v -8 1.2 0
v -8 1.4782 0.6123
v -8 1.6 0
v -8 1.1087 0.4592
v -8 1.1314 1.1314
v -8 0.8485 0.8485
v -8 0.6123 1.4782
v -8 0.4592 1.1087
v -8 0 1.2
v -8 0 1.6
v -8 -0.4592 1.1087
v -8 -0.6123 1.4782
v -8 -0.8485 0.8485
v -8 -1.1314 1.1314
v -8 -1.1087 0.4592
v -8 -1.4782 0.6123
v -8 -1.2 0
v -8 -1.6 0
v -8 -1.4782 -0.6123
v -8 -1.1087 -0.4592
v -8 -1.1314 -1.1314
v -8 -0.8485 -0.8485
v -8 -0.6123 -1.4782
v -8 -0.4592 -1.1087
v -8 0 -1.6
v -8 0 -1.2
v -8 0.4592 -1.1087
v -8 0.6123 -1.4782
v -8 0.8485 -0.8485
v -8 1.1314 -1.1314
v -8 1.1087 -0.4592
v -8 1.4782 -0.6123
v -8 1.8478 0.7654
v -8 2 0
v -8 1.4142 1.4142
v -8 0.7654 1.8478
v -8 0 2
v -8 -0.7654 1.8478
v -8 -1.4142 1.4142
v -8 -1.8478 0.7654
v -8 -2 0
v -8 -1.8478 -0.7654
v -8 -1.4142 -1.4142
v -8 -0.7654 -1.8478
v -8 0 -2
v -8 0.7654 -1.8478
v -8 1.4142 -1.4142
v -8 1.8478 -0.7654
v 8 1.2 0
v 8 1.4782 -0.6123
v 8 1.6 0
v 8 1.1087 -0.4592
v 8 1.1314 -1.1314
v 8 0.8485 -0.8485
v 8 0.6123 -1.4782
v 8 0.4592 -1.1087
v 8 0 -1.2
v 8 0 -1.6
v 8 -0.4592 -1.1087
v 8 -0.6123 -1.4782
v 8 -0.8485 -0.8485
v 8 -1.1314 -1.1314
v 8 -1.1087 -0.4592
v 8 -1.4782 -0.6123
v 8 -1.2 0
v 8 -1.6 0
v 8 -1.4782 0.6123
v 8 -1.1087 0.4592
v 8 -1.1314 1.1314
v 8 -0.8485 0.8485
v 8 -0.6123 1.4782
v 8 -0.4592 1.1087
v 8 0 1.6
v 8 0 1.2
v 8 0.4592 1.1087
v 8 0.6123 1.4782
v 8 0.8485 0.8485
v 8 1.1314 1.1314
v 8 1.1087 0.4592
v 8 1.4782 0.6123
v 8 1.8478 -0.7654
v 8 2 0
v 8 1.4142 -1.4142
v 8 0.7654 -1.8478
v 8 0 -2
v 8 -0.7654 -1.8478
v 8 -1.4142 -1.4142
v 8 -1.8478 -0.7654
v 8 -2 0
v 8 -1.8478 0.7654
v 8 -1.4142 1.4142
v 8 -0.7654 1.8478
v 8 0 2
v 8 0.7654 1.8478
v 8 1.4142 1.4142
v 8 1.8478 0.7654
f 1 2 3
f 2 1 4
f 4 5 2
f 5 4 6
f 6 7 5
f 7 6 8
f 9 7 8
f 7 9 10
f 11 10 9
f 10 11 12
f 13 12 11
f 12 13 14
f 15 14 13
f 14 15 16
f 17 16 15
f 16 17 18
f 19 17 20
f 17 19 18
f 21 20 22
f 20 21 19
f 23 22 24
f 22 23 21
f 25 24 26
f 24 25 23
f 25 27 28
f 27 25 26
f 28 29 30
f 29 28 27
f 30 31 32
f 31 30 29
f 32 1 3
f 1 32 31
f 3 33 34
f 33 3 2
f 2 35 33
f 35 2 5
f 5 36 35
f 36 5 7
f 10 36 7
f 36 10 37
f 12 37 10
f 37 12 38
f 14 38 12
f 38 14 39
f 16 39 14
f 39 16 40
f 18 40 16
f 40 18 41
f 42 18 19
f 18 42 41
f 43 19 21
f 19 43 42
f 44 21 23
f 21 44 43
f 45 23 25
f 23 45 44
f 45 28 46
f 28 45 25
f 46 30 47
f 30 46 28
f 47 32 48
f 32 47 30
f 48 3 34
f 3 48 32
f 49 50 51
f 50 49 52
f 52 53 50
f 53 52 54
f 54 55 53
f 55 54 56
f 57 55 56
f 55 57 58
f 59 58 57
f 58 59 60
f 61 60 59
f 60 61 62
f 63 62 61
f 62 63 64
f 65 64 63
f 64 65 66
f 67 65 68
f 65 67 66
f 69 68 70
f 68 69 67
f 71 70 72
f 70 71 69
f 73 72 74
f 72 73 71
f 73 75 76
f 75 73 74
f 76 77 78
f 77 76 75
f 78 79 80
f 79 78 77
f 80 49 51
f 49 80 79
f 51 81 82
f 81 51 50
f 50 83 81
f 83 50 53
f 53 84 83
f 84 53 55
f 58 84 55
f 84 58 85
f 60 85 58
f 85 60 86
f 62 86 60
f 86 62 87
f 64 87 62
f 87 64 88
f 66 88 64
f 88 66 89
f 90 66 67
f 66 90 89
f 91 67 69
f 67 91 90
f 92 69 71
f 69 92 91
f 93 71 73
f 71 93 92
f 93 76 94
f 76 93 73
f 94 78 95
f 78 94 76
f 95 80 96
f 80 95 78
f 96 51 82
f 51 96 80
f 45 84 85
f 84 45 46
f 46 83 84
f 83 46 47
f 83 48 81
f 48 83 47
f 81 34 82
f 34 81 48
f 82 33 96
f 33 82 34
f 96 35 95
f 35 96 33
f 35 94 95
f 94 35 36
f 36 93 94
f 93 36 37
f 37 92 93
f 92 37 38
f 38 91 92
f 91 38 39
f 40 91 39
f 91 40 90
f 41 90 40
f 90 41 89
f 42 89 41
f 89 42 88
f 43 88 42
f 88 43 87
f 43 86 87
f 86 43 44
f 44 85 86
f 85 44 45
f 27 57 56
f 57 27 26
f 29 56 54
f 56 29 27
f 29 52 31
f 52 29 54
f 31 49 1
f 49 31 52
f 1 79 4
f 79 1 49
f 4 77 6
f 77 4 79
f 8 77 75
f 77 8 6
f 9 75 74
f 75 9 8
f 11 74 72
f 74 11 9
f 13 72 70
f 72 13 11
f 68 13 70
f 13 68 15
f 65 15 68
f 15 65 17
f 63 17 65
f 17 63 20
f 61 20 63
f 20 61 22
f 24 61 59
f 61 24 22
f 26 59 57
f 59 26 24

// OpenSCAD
// file: ../p/4-4cyli.scad
use <../lib.scad>
function ldraw_lib__4_4cyli() = [
// 0 Cylinder 1.0
// 0 Name: 4-4cyli.dat
// 0 Author: James Jessiman
// 0 !LDRAW_ORG Primitive UPDATE 2005-01
// 0 !LICENSE Licensed under CC BY 4.0 : see CAreadme.txt
// 
// 0 BFC CERTIFY CCW
  [0,"BFC","CERTIFY"],
  [0,"BFC","CCW"],
// 
// 0 !HISTORY 1998-12-15 [PTadmin] Official Update 1998-10
// 0 !HISTORY 2002-03-23 [sbliss] Added BFC statement; merged headers from files in distributions LDraw 0.27 and Complete.
// 0 !HISTORY 2002-04-25 [PTadmin] Official Update 2002-02
// 0 !HISTORY 2004-12-14 [guyvivan] BFC CCW
// 0 !HISTORY 2005-12-28 [PTadmin] Official Update 2005-01
// 0 !HISTORY 2007-06-24 [PTadmin] Header formatted for Contributor Agreement
// 0 !HISTORY 2008-07-01 [PTadmin] Official Update 2008-01
// 
// 
// 4 16 1 1 0 0.9239 1 0.3827 0.9239 0 0.3827 1 0 0
  [4,16,1,1,0,0.9239,1,0.3827,0.9239,0,0.3827,1,0,0],
// 5 24 1 0 0 1 1 0 0.9239 0 0.3827 0.9239 0 -0.3827
  [5,24,1,0,0,1,1,0,0.9239,0,0.3827,0.9239,0,-0.3827],
// 4 16 0.9239 1 0.3827 0.7071 1 0.7071 0.7071 0 0.7071 0.9239 0 0.3827
  [4,16,0.9239,1,0.3827,0.7071,1,0.7071,0.7071,0,0.7071,0.9239,0,0.3827],
// 5 24 0.9239 0 0.3827 0.9239 1 0.3827 0.7071 0 0.7071 1 0 0
  [5,24,0.9239,0,0.3827,0.9239,1,0.3827,0.7071,0,0.7071,1,0,0],
// 4 16 0.7071 1 0.7071 0.3827 1 0.9239 0.3827 0 0.9239 0.7071 0 0.7071
  [4,16,0.7071,1,0.7071,0.3827,1,0.9239,0.3827,0,0.9239,0.7071,0,0.7071],
// 5 24 0.7071 0 0.7071 0.7071 1 0.7071 0.3827 0 0.9239 0.9239 0 0.3827
  [5,24,0.7071,0,0.7071,0.7071,1,0.7071,0.3827,0,0.9239,0.9239,0,0.3827],
// 4 16 0.3827 1 0.9239 0 1 1 0 0 1 0.3827 0 0.9239
  [4,16,0.3827,1,0.9239,0,1,1,0,0,1,0.3827,0,0.9239],
// 5 24 0.3827 0 0.9239 0.3827 1 0.9239 0 0 1 0.7071 0 0.7071
  [5,24,0.3827,0,0.9239,0.3827,1,0.9239,0,0,1,0.7071,0,0.7071],
// 4 16 0 1 1 -0.3827 1 0.9239 -0.3827 0 0.9239 0 0 1
  [4,16,0,1,1,-0.3827,1,0.9239,-0.3827,0,0.9239,0,0,1],
// 5 24 0 0 1 0 1 1 -0.3827 0 0.9239 0.3827 0 0.9239
  [5,24,0,0,1,0,1,1,-0.3827,0,0.9239,0.3827,0,0.9239],
// 4 16 -0.3827 1 0.9239 -0.7071 1 0.7071 -0.7071 0 0.7071 -0.3827 0 0.9239
  [4,16,-0.3827,1,0.9239,-0.7071,1,0.7071,-0.7071,0,0.7071,-0.3827,0,0.9239],
// 5 24 -0.3827 0 0.9239 -0.3827 1 0.9239 -0.7071 0 0.7071 0 0 1
  [5,24,-0.3827,0,0.9239,-0.3827,1,0.9239,-0.7071,0,0.7071,0,0,1],
// 4 16 -0.7071 1 0.7071 -0.9239 1 0.3827 -0.9239 0 0.3827 -0.7071 0 0.7071
  [4,16,-0.7071,1,0.7071,-0.9239,1,0.3827,-0.9239,0,0.3827,-0.7071,0,0.7071],
// 5 24 -0.7071 0 0.7071 -0.7071 1 0.7071 -0.9239 0 0.3827 -0.3827 0 0.9239
  [5,24,-0.7071,0,0.7071,-0.7071,1,0.7071,-0.9239,0,0.3827,-0.3827,0,0.9239],
// 4 16 -0.9239 1 0.3827 -1 1 0 -1 0 0 -0.9239 0 0.3827
  [4,16,-0.9239,1,0.3827,-1,1,0,-1,0,0,-0.9239,0,0.3827],
// 5 24 -0.9239 0 0.3827 -0.9239 1 0.3827 -1 0 0 -0.7071 0 0.7071
  [5,24,-0.9239,0,0.3827,-0.9239,1,0.3827,-1,0,0,-0.7071,0,0.7071],
// 4 16 -1 1 0 -0.9239 1 -0.3827 -0.9239 0 -0.3827 -1 0 0
  [4,16,-1,1,0,-0.9239,1,-0.3827,-0.9239,0,-0.3827,-1,0,0],
// 5 24 -1 0 0 -1 1 0 -0.9239 0 -0.3827 -0.9239 0 0.3827
  [5,24,-1,0,0,-1,1,0,-0.9239,0,-0.3827,-0.9239,0,0.3827],
// 4 16 -0.9239 1 -0.3827 -0.7071 1 -0.7071 -0.7071 0 -0.7071 -0.9239 0 -0.3827
  [4,16,-0.9239,1,-0.3827,-0.7071,1,-0.7071,-0.7071,0,-0.7071,-0.9239,0,-0.3827],
// 5 24 -0.9239 0 -0.3827 -0.9239 1 -0.3827 -0.7071 0 -0.7071 -1 0 0
  [5,24,-0.9239,0,-0.3827,-0.9239,1,-0.3827,-0.7071,0,-0.7071,-1,0,0],
// 4 16 -0.7071 1 -0.7071 -0.3827 1 -0.9239 -0.3827 0 -0.9239 -0.7071 0 -0.7071
  [4,16,-0.7071,1,-0.7071,-0.3827,1,-0.9239,-0.3827,0,-0.9239,-0.7071,0,-0.7071],
// 5 24 -0.7071 0 -0.7071 -0.7071 1 -0.7071 -0.3827 0 -0.9239 -0.9239 0 -0.3827
  [5,24,-0.7071,0,-0.7071,-0.7071,1,-0.7071,-0.3827,0,-0.9239,-0.9239,0,-0.3827],
// 4 16 -0.3827 1 -0.9239 0 1 -1 0 0 -1 -0.3827 0 -0.9239
  [4,16,-0.3827,1,-0.9239,0,1,-1,0,0,-1,-0.3827,0,-0.9239],
// 5 24 -0.3827 0 -0.9239 -0.3827 1 -0.9239 0 0 -1 -0.7071 0 -0.7071
  [5,24,-0.3827,0,-0.9239,-0.3827,1,-0.9239,0,0,-1,-0.7071,0,-0.7071],
// 4 16 0 1 -1 0.3827 1 -0.9239 0.3827 0 -0.9239 0 0 -1
  [4,16,0,1,-1,0.3827,1,-0.9239,0.3827,0,-0.9239,0,0,-1],
// 5 24 0 0 -1 0 1 -1 0.3827 0 -0.9239 -0.3827 0 -0.9239
  [5,24,0,0,-1,0,1,-1,0.3827,0,-0.9239,-0.3827,0,-0.9239],
// 4 16 0.3827 1 -0.9239 0.7071 1 -0.7071 0.7071 0 -0.7071 0.3827 0 -0.9239
  [4,16,0.3827,1,-0.9239,0.7071,1,-0.7071,0.7071,0,-0.7071,0.3827,0,-0.9239],
// 5 24 0.3827 0 -0.9239 0.3827 1 -0.9239 0.7071 0 -0.7071 0 0 -1
  [5,24,0.3827,0,-0.9239,0.3827,1,-0.9239,0.7071,0,-0.7071,0,0,-1],
// 4 16 0.7071 1 -0.7071 0.9239 1 -0.3827 0.9239 0 -0.3827 0.7071 0 -0.7071
  [4,16,0.7071,1,-0.7071,0.9239,1,-0.3827,0.9239,0,-0.3827,0.7071,0,-0.7071],
// 5 24 0.7071 0 -0.7071 0.7071 1 -0.7071 0.9239 0 -0.3827 0.3827 0 -0.9239
  [5,24,0.7071,0,-0.7071,0.7071,1,-0.7071,0.9239,0,-0.3827,0.3827,0,-0.9239],
// 4 16 0.9239 1 -0.3827 1 1 0 1 0 0 0.9239 0 -0.3827
  [4,16,0.9239,1,-0.3827,1,1,0,1,0,0,0.9239,0,-0.3827],
// 5 24 0.9239 0 -0.3827 0.9239 1 -0.3827 1 0 0 0.7071 0 -0.7071
  [5,24,0.9239,0,-0.3827,0.9239,1,-0.3827,1,0,0,0.7071,0,-0.7071],
// 0
];
module ldraw_lib__4_4cyli(step=0, col=false, unit=2/5, alt=false, line=0.2, solid=!$preview)
    makepoly(ldraw_lib__4_4cyli(), step=step, col=col, unit=unit, alt=alt, line=line, solid=solid);
ldraw_lib__4_4cyli(line=0.2);
// file: ../p/4-4ring4.scad
use <../lib.scad>
function ldraw_lib__4_4ring4() = [
// 0 Ring  4 x 1.0
// 0 Name: 4-4ring4.dat
// 0 Author: James Jessiman
// 0 !LDRAW_ORG Primitive UPDATE 2009-01
// 0 !LICENSE Licensed under CC BY 4.0 : see CAreadme.txt
// 
// 0 BFC CERTIFY CCW
  [0,"BFC","CERTIFY"],
  [0,"BFC","CCW"],
// 
// 0 !HISTORY 1998-12-15 [PTadmin] Official Update 1998-10
// 0 !HISTORY 2002-04-08 [BrickCaster] Modified for BFC compliance
// 0 !HISTORY 2002-04-25 [PTadmin] Official Update 2002-02
// 0 !HISTORY 2007-06-24 [PTadmin] Header formatted for Contributor Agreement
// 0 !HISTORY 2008-07-01 [PTadmin] Official Update 2008-01
// 0 !HISTORY 2008-08-26 [cwdee] Switch polygon winding and rename
// 0 !HISTORY 2009-05-02 [PTadmin] Official Update 2009-01
// 
// 
// 4 16 -1.9135 0 4.6195 -1.5308 0 3.6956 0 0 4 0 0 5
  [4,16,-1.9135,0,4.6195,-1.5308,0,3.6956,0,0,4,0,0,5],
// 4 16 -3.5355 0 3.5355 -2.8284 0 2.8284 -1.5308 0 3.6956 -1.9135 0 4.6195
  [4,16,-3.5355,0,3.5355,-2.8284,0,2.8284,-1.5308,0,3.6956,-1.9135,0,4.6195],
// 4 16 -4.6195 0 1.9135 -3.6956 0 1.5308 -2.8284 0 2.8284 -3.5355 0 3.5355
  [4,16,-4.6195,0,1.9135,-3.6956,0,1.5308,-2.8284,0,2.8284,-3.5355,0,3.5355],
// 4 16 -5 0 0 -4 0 0 -3.6956 0 1.5308 -4.6195 0 1.9135
  [4,16,-5,0,0,-4,0,0,-3.6956,0,1.5308,-4.6195,0,1.9135],
// 4 16 -4.6195 0 -1.9135 -3.6956 0 -1.5308 -4 0 0 -5 0 0
  [4,16,-4.6195,0,-1.9135,-3.6956,0,-1.5308,-4,0,0,-5,0,0],
// 4 16 -3.5355 0 -3.5355 -2.8284 0 -2.8284 -3.6956 0 -1.5308 -4.6195 0 -1.9135
  [4,16,-3.5355,0,-3.5355,-2.8284,0,-2.8284,-3.6956,0,-1.5308,-4.6195,0,-1.9135],
// 4 16 -1.9135 0 -4.6195 -1.5308 0 -3.6956 -2.8284 0 -2.8284 -3.5355 0 -3.5355
  [4,16,-1.9135,0,-4.6195,-1.5308,0,-3.6956,-2.8284,0,-2.8284,-3.5355,0,-3.5355],
// 4 16 0 0 -5 0 0 -4 -1.5308 0 -3.6956 -1.9135 0 -4.6195
  [4,16,0,0,-5,0,0,-4,-1.5308,0,-3.6956,-1.9135,0,-4.6195],
// 4 16 1.9135 0 -4.6195 1.5308 0 -3.6956 0 0 -4 0 0 -5
  [4,16,1.9135,0,-4.6195,1.5308,0,-3.6956,0,0,-4,0,0,-5],
// 4 16 3.5355 0 -3.5355 2.8284 0 -2.8284 1.5308 0 -3.6956 1.9135 0 -4.6195
  [4,16,3.5355,0,-3.5355,2.8284,0,-2.8284,1.5308,0,-3.6956,1.9135,0,-4.6195],
// 4 16 4.6195 0 -1.9135 3.6956 0 -1.5308 2.8284 0 -2.8284 3.5355 0 -3.5355
  [4,16,4.6195,0,-1.9135,3.6956,0,-1.5308,2.8284,0,-2.8284,3.5355,0,-3.5355],
// 4 16 5 0 0 4 0 0 3.6956 0 -1.5308 4.6195 0 -1.9135
  [4,16,5,0,0,4,0,0,3.6956,0,-1.5308,4.6195,0,-1.9135],
// 4 16 4.6195 0 1.9135 3.6956 0 1.5308 4 0 0 5 0 0
  [4,16,4.6195,0,1.9135,3.6956,0,1.5308,4,0,0,5,0,0],
// 4 16 3.5355 0 3.5355 2.8284 0 2.8284 3.6956 0 1.5308 4.6195 0 1.9135
  [4,16,3.5355,0,3.5355,2.8284,0,2.8284,3.6956,0,1.5308,4.6195,0,1.9135],
// 4 16 1.9135 0 4.6195 1.5308 0 3.6956 2.8284 0 2.8284 3.5355 0 3.5355
  [4,16,1.9135,0,4.6195,1.5308,0,3.6956,2.8284,0,2.8284,3.5355,0,3.5355],
// 4 16 0 0 5 0 0 4 1.5308 0 3.6956 1.9135 0 4.6195
  [4,16,0,0,5,0,0,4,1.5308,0,3.6956,1.9135,0,4.6195],
// 0
];
module ldraw_lib__4_4ring4(step=0, col=false, unit=2/5, alt=false, line=0.2, solid=!$preview)
    makepoly(ldraw_lib__4_4ring4(), step=step, col=col, unit=unit, alt=alt, line=line, solid=solid);
ldraw_lib__4_4ring4(line=0.2);
// file: ../p/4-4ring3.scad
use <../lib.scad>
function ldraw_lib__4_4ring3() = [
// 0 Ring  3 x 1.0
// 0 Name: 4-4ring3.dat
// 0 Author: James Jessiman
// 0 !LDRAW_ORG Primitive UPDATE 2009-01
// 0 !LICENSE Licensed under CC BY 4.0 : see CAreadme.txt
// 
// 0 BFC CERTIFY CCW
  [0,"BFC","CERTIFY"],
  [0,"BFC","CCW"],
// 
// 0 !HISTORY 1998-12-15 [PTadmin] Official Update 1998-10
// 0 !HISTORY 2002-04-05 [hafhead] Added BFC statement
// 0 !HISTORY 2002-04-25 [PTadmin] Official Update 2002-02
// 0 !HISTORY 2007-06-24 [PTadmin] Header formatted for Contributor Agreement
// 0 !HISTORY 2008-07-01 [PTadmin] Official Update 2008-01
// 0 !HISTORY 2008-08-26 [cwdee] Switch polygon winding and rename
// 0 !HISTORY 2009-05-02 [PTadmin] Official Update 2009-01
// 
// 
// 4 16 -1.5308 0 3.6956 -1.1481 0 2.7717 0 0 3 0 0 4
  [4,16,-1.5308,0,3.6956,-1.1481,0,2.7717,0,0,3,0,0,4],
// 4 16 -2.8284 0 2.8284 -2.1213 0 2.1213 -1.1481 0 2.7717 -1.5308 0 3.6956
  [4,16,-2.8284,0,2.8284,-2.1213,0,2.1213,-1.1481,0,2.7717,-1.5308,0,3.6956],
// 4 16 -3.6956 0 1.5308 -2.7717 0 1.1481 -2.1213 0 2.1213 -2.8284 0 2.8284
  [4,16,-3.6956,0,1.5308,-2.7717,0,1.1481,-2.1213,0,2.1213,-2.8284,0,2.8284],
// 4 16 -4 0 0 -3 0 0 -2.7717 0 1.1481 -3.6956 0 1.5308
  [4,16,-4,0,0,-3,0,0,-2.7717,0,1.1481,-3.6956,0,1.5308],
// 4 16 -3.6956 0 -1.5308 -2.7717 0 -1.1481 -3 0 0 -4 0 0
  [4,16,-3.6956,0,-1.5308,-2.7717,0,-1.1481,-3,0,0,-4,0,0],
// 4 16 -2.8284 0 -2.8284 -2.1213 0 -2.1213 -2.7717 0 -1.1481 -3.6956 0 -1.5308
  [4,16,-2.8284,0,-2.8284,-2.1213,0,-2.1213,-2.7717,0,-1.1481,-3.6956,0,-1.5308],
// 4 16 -1.5308 0 -3.6956 -1.1481 0 -2.7717 -2.1213 0 -2.1213 -2.8284 0 -2.8284
  [4,16,-1.5308,0,-3.6956,-1.1481,0,-2.7717,-2.1213,0,-2.1213,-2.8284,0,-2.8284],
// 4 16 0 0 -4 0 0 -3 -1.1481 0 -2.7717 -1.5308 0 -3.6956
  [4,16,0,0,-4,0,0,-3,-1.1481,0,-2.7717,-1.5308,0,-3.6956],
// 4 16 1.5308 0 -3.6956 1.1481 0 -2.7717 0 0 -3 0 0 -4
  [4,16,1.5308,0,-3.6956,1.1481,0,-2.7717,0,0,-3,0,0,-4],
// 4 16 2.8284 0 -2.8284 2.1213 0 -2.1213 1.1481 0 -2.7717 1.5308 0 -3.6956
  [4,16,2.8284,0,-2.8284,2.1213,0,-2.1213,1.1481,0,-2.7717,1.5308,0,-3.6956],
// 4 16 3.6956 0 -1.5308 2.7717 0 -1.1481 2.1213 0 -2.1213 2.8284 0 -2.8284
  [4,16,3.6956,0,-1.5308,2.7717,0,-1.1481,2.1213,0,-2.1213,2.8284,0,-2.8284],
// 4 16 4 0 0 3 0 0 2.7717 0 -1.1481 3.6956 0 -1.5308
  [4,16,4,0,0,3,0,0,2.7717,0,-1.1481,3.6956,0,-1.5308],
// 4 16 3.6956 0 1.5308 2.7717 0 1.1481 3 0 0 4 0 0
  [4,16,3.6956,0,1.5308,2.7717,0,1.1481,3,0,0,4,0,0],
// 4 16 2.8284 0 2.8284 2.1213 0 2.1213 2.7717 0 1.1481 3.6956 0 1.5308
  [4,16,2.8284,0,2.8284,2.1213,0,2.1213,2.7717,0,1.1481,3.6956,0,1.5308],
// 4 16 1.5308 0 3.6956 1.1481 0 2.7717 2.1213 0 2.1213 2.8284 0 2.8284
  [4,16,1.5308,0,3.6956,1.1481,0,2.7717,2.1213,0,2.1213,2.8284,0,2.8284],
// 4 16 0 0 4 0 0 3 1.1481 0 2.7717 1.5308 0 3.6956
  [4,16,0,0,4,0,0,3,1.1481,0,2.7717,1.5308,0,3.6956],
// 0
];
module ldraw_lib__4_4ring3(step=0, col=false, unit=2/5, alt=false, line=0.2, solid=!$preview)
    makepoly(ldraw_lib__4_4ring3(), step=step, col=col, unit=unit, alt=alt, line=line, solid=solid);
ldraw_lib__4_4ring3(line=0.2);
// file: ../p/4-4edge.scad
use <../lib.scad>
function ldraw_lib__4_4edge() = [
// 0 Circle 1.0
// 0 Name: 4-4edge.dat
// 0 Author: James Jessiman
// 0 !LDRAW_ORG Primitive UPDATE 2017-01
// 0 !LICENSE Licensed under CC BY 4.0 : see CAreadme.txt
// 
// 0 BFC CERTIFY CCW
  [0,"BFC","CERTIFY"],
  [0,"BFC","CCW"],
// 
// 0 !HISTORY 1998-12-15 [PTadmin] Official Update 1998-10
// 0 !HISTORY 2005-12-28 [PTadmin] Official Update 2005-01
// 0 !HISTORY 2007-06-24 [PTadmin] Header formatted for Contributor Agreement
// 0 !HISTORY 2008-07-01 [PTadmin] Official Update 2008-01
// 0 !HISTORY 2017-01-15 [Steffen] BFCed
// 0 !HISTORY 2017-12-30 [PTadmin] Official Update 2017-01
// 
// 
// 2 24 1 0 0 0.9239 0 0.3827
  [2,24,1,0,0,0.9239,0,0.3827],
// 2 24 0.9239 0 0.3827 0.7071 0 0.7071
  [2,24,0.9239,0,0.3827,0.7071,0,0.7071],
// 2 24 0.7071 0 0.7071 0.3827 0 0.9239
  [2,24,0.7071,0,0.7071,0.3827,0,0.9239],
// 2 24 0.3827 0 0.9239 0 0 1
  [2,24,0.3827,0,0.9239,0,0,1],
// 2 24 0 0 1 -0.3827 0 0.9239
  [2,24,0,0,1,-0.3827,0,0.9239],
// 2 24 -0.3827 0 0.9239 -0.7071 0 0.7071
  [2,24,-0.3827,0,0.9239,-0.7071,0,0.7071],
// 2 24 -0.7071 0 0.7071 -0.9239 0 0.3827
  [2,24,-0.7071,0,0.7071,-0.9239,0,0.3827],
// 2 24 -0.9239 0 0.3827 -1 0 -0
  [2,24,-0.9239,0,0.3827,-1,0,-0],
// 2 24 -1 0 -0 -0.9239 0 -0.3827
  [2,24,-1,0,-0,-0.9239,0,-0.3827],
// 2 24 -0.9239 0 -0.3827 -0.7071 0 -0.7071
  [2,24,-0.9239,0,-0.3827,-0.7071,0,-0.7071],
// 2 24 -0.7071 0 -0.7071 -0.3827 0 -0.9239
  [2,24,-0.7071,0,-0.7071,-0.3827,0,-0.9239],
// 2 24 -0.3827 0 -0.9239 0 0 -1
  [2,24,-0.3827,0,-0.9239,0,0,-1],
// 2 24 0 0 -1 0.3827 0 -0.9239
  [2,24,0,0,-1,0.3827,0,-0.9239],
// 2 24 0.3827 0 -0.9239 0.7071 0 -0.7071
  [2,24,0.3827,0,-0.9239,0.7071,0,-0.7071],
// 2 24 0.7071 0 -0.7071 0.9239 0 -0.3827
  [2,24,0.7071,0,-0.7071,0.9239,0,-0.3827],
// 2 24 0.9239 0 -0.3827 1 0 0
  [2,24,0.9239,0,-0.3827,1,0,0],
];
module ldraw_lib__4_4edge(step=0, col=false, unit=2/5, alt=false, line=0.2, solid=!$preview)
    makepoly(ldraw_lib__4_4edge(), step=step, col=col, unit=unit, alt=alt, line=line, solid=solid);
ldraw_lib__4_4edge(line=0.2);
// file: 71533k03.scad
use <../lib.scad>
use <../p/4-4cyli.scad>
function ldraw_lib__71533k03() = [
// 0 ~Technic Pneumatic Tube Segment
// 0 Name: 71533k03.dat
// 0 Author: Jaco van der Molen [Jaco]
// 0 !LDRAW_ORG Part Flexible_Section UPDATE 2020-01
// 0 !LICENSE Licensed under CC BY 4.0 : see CAreadme.txt
// 
// 0 BFC CERTIFY CW
  [0,"BFC","CERTIFY"],
  [0,"BFC","CW"],
// 
// 0 !HISTORY 2003-11-30 [Steffen] BFCed
// 0 !HISTORY 2009-12-29 [PTadmin] Official Update 2009-03
// 0 !HISTORY 2020-06-27 [PTadmin] Renamed from 166
// 0 !HISTORY 2020-06-28 [PTadmin] Official Update 2020-01
// 
// 
// 1 16 0 0 0 5 0 0 0 1 0 0 0 5 4-4cyli.dat
  [1,16,0,0,0,5,0,0,0,1,0,0,0,5, ldraw_lib__4_4cyli()],
// 0 BFC INVERTNEXT
  [0,"BFC","INVERTNEXT"],
// 1 16 0 0 0 3 0 0 0 1 0 0 0 3 4-4cyli.dat
  [1,16,0,0,0,3,0,0,0,1,0,0,0,3, ldraw_lib__4_4cyli()],
// 0
];
module ldraw_lib__71533k03(step=0, col=false, unit=2/5, alt=false, line=0.2, solid=!$preview)
    makepoly(ldraw_lib__71533k03(), step=step, col=col, unit=unit, alt=alt, line=line, solid=solid);
ldraw_lib__71533k03(line=0.2);
// file: 71533k02.scad
use <../lib.scad>
use <../p/4-4edge.scad>
use <../p/4-4ring3.scad>
use <../p/4-4ring4.scad>
function ldraw_lib__71533k02() = [
// 0 ~Technic Pneumatic Tube End (Non-Bulged)
// 0 Name: 71533k02.dat
// 0 Author: Steffen [Steffen]
// 0 !LDRAW_ORG Part Flexible_Section UPDATE 2020-01
// 0 !LICENSE Licensed under CC BY 4.0 : see CAreadme.txt
// 
// 0 BFC CERTIFY CCW
  [0,"BFC","CERTIFY"],
  [0,"BFC","CCW"],
// 
// 0 !HISTORY 2020-06-28 [PTadmin] Official Update 2020-01
// 
// 
// 0 // This file goes together with 71533k01.dat and 71533k03.dat.
// 0 // Those 3 files can be used to create Technic Pneumatic Tubes
// 0 // with either bulged or non-bulged ends.
// 
// 1 16 0 0 0 1 0 0 0 1 0 0 0 1 4-4ring3.dat
  [1,16,0,0,0,1,0,0,0,1,0,0,0,1, ldraw_lib__4_4ring3()],
// 1 16 0 0 0 1 0 0 0 1 0 0 0 1 4-4ring4.dat
  [1,16,0,0,0,1,0,0,0,1,0,0,0,1, ldraw_lib__4_4ring4()],
// 1 16 0 0 0 3 0 0 0 3 0 0 0 3 4-4edge.dat
  [1,16,0,0,0,3,0,0,0,3,0,0,0,3, ldraw_lib__4_4edge()],
// 1 16 0 0 0 5 0 0 0 5 0 0 0 5 4-4edge.dat
  [1,16,0,0,0,5,0,0,0,5,0,0,0,5, ldraw_lib__4_4edge()],
];
module ldraw_lib__71533k02(step=0, col=false, unit=2/5, alt=false, line=0.2, solid=!$preview)
    makepoly(ldraw_lib__71533k02(), step=step, col=col, unit=unit, alt=alt, line=line, solid=solid);
ldraw_lib__71533k02(line=0.2);
// main file
use <../lib.scad>
use <71533k02.scad>
use <71533k03.scad>
function ldraw_lib__79306_f1() = [
// 0 Technic Pneumatic Tube  2L
// 0 Name: 79306-f1.dat
// 0 Author: Johann Eisner [technicbasics]
// 0 !LDRAW_ORG Part UPDATE 2023-06
// 0 !LICENSE Licensed under CC BY 4.0 : see CAreadme.txt
// 
// 0 BFC CERTIFY CCW
  [0,"BFC","CERTIFY"],
  [0,"BFC","CCW"],
// 
// 0 !KEYWORDS 16 mm, BrickLink 79306, Rebrickable 5102c02
// 
// 0 !HISTORY 2023-11-19 [OrionP] Official Update 2023-06
// 
// 
// 1 16 -20 0 0 0 1 0 1 0 0 0 0 1 71533k02.dat
  [1,16,-20,0,0,0,1,0,1,0,0,0,0,1, ldraw_lib__71533k02()],
// 1 16 20 0 0 0 -1 0 -1 0 0 0 0 1 71533k02.dat
  [1,16,20,0,0,0,-1,0,-1,0,0,0,0,1, ldraw_lib__71533k02()],
// 1 16 -20 0 0 0 40 0 1 0 0 0 0 1 71533k03.dat
  [1,16,-20,0,0,0,40,0,1,0,0,0,0,1, ldraw_lib__71533k03()],
];
module ldraw_lib__79306_f1(step=0, col=false, unit=2/5, alt=false, line=0.2, solid=!$preview)
    makepoly(ldraw_lib__79306_f1(), step=step, col=col, unit=unit, alt=alt, line=line, solid=solid);
ldraw_lib__79306_f1(line=0.2);
